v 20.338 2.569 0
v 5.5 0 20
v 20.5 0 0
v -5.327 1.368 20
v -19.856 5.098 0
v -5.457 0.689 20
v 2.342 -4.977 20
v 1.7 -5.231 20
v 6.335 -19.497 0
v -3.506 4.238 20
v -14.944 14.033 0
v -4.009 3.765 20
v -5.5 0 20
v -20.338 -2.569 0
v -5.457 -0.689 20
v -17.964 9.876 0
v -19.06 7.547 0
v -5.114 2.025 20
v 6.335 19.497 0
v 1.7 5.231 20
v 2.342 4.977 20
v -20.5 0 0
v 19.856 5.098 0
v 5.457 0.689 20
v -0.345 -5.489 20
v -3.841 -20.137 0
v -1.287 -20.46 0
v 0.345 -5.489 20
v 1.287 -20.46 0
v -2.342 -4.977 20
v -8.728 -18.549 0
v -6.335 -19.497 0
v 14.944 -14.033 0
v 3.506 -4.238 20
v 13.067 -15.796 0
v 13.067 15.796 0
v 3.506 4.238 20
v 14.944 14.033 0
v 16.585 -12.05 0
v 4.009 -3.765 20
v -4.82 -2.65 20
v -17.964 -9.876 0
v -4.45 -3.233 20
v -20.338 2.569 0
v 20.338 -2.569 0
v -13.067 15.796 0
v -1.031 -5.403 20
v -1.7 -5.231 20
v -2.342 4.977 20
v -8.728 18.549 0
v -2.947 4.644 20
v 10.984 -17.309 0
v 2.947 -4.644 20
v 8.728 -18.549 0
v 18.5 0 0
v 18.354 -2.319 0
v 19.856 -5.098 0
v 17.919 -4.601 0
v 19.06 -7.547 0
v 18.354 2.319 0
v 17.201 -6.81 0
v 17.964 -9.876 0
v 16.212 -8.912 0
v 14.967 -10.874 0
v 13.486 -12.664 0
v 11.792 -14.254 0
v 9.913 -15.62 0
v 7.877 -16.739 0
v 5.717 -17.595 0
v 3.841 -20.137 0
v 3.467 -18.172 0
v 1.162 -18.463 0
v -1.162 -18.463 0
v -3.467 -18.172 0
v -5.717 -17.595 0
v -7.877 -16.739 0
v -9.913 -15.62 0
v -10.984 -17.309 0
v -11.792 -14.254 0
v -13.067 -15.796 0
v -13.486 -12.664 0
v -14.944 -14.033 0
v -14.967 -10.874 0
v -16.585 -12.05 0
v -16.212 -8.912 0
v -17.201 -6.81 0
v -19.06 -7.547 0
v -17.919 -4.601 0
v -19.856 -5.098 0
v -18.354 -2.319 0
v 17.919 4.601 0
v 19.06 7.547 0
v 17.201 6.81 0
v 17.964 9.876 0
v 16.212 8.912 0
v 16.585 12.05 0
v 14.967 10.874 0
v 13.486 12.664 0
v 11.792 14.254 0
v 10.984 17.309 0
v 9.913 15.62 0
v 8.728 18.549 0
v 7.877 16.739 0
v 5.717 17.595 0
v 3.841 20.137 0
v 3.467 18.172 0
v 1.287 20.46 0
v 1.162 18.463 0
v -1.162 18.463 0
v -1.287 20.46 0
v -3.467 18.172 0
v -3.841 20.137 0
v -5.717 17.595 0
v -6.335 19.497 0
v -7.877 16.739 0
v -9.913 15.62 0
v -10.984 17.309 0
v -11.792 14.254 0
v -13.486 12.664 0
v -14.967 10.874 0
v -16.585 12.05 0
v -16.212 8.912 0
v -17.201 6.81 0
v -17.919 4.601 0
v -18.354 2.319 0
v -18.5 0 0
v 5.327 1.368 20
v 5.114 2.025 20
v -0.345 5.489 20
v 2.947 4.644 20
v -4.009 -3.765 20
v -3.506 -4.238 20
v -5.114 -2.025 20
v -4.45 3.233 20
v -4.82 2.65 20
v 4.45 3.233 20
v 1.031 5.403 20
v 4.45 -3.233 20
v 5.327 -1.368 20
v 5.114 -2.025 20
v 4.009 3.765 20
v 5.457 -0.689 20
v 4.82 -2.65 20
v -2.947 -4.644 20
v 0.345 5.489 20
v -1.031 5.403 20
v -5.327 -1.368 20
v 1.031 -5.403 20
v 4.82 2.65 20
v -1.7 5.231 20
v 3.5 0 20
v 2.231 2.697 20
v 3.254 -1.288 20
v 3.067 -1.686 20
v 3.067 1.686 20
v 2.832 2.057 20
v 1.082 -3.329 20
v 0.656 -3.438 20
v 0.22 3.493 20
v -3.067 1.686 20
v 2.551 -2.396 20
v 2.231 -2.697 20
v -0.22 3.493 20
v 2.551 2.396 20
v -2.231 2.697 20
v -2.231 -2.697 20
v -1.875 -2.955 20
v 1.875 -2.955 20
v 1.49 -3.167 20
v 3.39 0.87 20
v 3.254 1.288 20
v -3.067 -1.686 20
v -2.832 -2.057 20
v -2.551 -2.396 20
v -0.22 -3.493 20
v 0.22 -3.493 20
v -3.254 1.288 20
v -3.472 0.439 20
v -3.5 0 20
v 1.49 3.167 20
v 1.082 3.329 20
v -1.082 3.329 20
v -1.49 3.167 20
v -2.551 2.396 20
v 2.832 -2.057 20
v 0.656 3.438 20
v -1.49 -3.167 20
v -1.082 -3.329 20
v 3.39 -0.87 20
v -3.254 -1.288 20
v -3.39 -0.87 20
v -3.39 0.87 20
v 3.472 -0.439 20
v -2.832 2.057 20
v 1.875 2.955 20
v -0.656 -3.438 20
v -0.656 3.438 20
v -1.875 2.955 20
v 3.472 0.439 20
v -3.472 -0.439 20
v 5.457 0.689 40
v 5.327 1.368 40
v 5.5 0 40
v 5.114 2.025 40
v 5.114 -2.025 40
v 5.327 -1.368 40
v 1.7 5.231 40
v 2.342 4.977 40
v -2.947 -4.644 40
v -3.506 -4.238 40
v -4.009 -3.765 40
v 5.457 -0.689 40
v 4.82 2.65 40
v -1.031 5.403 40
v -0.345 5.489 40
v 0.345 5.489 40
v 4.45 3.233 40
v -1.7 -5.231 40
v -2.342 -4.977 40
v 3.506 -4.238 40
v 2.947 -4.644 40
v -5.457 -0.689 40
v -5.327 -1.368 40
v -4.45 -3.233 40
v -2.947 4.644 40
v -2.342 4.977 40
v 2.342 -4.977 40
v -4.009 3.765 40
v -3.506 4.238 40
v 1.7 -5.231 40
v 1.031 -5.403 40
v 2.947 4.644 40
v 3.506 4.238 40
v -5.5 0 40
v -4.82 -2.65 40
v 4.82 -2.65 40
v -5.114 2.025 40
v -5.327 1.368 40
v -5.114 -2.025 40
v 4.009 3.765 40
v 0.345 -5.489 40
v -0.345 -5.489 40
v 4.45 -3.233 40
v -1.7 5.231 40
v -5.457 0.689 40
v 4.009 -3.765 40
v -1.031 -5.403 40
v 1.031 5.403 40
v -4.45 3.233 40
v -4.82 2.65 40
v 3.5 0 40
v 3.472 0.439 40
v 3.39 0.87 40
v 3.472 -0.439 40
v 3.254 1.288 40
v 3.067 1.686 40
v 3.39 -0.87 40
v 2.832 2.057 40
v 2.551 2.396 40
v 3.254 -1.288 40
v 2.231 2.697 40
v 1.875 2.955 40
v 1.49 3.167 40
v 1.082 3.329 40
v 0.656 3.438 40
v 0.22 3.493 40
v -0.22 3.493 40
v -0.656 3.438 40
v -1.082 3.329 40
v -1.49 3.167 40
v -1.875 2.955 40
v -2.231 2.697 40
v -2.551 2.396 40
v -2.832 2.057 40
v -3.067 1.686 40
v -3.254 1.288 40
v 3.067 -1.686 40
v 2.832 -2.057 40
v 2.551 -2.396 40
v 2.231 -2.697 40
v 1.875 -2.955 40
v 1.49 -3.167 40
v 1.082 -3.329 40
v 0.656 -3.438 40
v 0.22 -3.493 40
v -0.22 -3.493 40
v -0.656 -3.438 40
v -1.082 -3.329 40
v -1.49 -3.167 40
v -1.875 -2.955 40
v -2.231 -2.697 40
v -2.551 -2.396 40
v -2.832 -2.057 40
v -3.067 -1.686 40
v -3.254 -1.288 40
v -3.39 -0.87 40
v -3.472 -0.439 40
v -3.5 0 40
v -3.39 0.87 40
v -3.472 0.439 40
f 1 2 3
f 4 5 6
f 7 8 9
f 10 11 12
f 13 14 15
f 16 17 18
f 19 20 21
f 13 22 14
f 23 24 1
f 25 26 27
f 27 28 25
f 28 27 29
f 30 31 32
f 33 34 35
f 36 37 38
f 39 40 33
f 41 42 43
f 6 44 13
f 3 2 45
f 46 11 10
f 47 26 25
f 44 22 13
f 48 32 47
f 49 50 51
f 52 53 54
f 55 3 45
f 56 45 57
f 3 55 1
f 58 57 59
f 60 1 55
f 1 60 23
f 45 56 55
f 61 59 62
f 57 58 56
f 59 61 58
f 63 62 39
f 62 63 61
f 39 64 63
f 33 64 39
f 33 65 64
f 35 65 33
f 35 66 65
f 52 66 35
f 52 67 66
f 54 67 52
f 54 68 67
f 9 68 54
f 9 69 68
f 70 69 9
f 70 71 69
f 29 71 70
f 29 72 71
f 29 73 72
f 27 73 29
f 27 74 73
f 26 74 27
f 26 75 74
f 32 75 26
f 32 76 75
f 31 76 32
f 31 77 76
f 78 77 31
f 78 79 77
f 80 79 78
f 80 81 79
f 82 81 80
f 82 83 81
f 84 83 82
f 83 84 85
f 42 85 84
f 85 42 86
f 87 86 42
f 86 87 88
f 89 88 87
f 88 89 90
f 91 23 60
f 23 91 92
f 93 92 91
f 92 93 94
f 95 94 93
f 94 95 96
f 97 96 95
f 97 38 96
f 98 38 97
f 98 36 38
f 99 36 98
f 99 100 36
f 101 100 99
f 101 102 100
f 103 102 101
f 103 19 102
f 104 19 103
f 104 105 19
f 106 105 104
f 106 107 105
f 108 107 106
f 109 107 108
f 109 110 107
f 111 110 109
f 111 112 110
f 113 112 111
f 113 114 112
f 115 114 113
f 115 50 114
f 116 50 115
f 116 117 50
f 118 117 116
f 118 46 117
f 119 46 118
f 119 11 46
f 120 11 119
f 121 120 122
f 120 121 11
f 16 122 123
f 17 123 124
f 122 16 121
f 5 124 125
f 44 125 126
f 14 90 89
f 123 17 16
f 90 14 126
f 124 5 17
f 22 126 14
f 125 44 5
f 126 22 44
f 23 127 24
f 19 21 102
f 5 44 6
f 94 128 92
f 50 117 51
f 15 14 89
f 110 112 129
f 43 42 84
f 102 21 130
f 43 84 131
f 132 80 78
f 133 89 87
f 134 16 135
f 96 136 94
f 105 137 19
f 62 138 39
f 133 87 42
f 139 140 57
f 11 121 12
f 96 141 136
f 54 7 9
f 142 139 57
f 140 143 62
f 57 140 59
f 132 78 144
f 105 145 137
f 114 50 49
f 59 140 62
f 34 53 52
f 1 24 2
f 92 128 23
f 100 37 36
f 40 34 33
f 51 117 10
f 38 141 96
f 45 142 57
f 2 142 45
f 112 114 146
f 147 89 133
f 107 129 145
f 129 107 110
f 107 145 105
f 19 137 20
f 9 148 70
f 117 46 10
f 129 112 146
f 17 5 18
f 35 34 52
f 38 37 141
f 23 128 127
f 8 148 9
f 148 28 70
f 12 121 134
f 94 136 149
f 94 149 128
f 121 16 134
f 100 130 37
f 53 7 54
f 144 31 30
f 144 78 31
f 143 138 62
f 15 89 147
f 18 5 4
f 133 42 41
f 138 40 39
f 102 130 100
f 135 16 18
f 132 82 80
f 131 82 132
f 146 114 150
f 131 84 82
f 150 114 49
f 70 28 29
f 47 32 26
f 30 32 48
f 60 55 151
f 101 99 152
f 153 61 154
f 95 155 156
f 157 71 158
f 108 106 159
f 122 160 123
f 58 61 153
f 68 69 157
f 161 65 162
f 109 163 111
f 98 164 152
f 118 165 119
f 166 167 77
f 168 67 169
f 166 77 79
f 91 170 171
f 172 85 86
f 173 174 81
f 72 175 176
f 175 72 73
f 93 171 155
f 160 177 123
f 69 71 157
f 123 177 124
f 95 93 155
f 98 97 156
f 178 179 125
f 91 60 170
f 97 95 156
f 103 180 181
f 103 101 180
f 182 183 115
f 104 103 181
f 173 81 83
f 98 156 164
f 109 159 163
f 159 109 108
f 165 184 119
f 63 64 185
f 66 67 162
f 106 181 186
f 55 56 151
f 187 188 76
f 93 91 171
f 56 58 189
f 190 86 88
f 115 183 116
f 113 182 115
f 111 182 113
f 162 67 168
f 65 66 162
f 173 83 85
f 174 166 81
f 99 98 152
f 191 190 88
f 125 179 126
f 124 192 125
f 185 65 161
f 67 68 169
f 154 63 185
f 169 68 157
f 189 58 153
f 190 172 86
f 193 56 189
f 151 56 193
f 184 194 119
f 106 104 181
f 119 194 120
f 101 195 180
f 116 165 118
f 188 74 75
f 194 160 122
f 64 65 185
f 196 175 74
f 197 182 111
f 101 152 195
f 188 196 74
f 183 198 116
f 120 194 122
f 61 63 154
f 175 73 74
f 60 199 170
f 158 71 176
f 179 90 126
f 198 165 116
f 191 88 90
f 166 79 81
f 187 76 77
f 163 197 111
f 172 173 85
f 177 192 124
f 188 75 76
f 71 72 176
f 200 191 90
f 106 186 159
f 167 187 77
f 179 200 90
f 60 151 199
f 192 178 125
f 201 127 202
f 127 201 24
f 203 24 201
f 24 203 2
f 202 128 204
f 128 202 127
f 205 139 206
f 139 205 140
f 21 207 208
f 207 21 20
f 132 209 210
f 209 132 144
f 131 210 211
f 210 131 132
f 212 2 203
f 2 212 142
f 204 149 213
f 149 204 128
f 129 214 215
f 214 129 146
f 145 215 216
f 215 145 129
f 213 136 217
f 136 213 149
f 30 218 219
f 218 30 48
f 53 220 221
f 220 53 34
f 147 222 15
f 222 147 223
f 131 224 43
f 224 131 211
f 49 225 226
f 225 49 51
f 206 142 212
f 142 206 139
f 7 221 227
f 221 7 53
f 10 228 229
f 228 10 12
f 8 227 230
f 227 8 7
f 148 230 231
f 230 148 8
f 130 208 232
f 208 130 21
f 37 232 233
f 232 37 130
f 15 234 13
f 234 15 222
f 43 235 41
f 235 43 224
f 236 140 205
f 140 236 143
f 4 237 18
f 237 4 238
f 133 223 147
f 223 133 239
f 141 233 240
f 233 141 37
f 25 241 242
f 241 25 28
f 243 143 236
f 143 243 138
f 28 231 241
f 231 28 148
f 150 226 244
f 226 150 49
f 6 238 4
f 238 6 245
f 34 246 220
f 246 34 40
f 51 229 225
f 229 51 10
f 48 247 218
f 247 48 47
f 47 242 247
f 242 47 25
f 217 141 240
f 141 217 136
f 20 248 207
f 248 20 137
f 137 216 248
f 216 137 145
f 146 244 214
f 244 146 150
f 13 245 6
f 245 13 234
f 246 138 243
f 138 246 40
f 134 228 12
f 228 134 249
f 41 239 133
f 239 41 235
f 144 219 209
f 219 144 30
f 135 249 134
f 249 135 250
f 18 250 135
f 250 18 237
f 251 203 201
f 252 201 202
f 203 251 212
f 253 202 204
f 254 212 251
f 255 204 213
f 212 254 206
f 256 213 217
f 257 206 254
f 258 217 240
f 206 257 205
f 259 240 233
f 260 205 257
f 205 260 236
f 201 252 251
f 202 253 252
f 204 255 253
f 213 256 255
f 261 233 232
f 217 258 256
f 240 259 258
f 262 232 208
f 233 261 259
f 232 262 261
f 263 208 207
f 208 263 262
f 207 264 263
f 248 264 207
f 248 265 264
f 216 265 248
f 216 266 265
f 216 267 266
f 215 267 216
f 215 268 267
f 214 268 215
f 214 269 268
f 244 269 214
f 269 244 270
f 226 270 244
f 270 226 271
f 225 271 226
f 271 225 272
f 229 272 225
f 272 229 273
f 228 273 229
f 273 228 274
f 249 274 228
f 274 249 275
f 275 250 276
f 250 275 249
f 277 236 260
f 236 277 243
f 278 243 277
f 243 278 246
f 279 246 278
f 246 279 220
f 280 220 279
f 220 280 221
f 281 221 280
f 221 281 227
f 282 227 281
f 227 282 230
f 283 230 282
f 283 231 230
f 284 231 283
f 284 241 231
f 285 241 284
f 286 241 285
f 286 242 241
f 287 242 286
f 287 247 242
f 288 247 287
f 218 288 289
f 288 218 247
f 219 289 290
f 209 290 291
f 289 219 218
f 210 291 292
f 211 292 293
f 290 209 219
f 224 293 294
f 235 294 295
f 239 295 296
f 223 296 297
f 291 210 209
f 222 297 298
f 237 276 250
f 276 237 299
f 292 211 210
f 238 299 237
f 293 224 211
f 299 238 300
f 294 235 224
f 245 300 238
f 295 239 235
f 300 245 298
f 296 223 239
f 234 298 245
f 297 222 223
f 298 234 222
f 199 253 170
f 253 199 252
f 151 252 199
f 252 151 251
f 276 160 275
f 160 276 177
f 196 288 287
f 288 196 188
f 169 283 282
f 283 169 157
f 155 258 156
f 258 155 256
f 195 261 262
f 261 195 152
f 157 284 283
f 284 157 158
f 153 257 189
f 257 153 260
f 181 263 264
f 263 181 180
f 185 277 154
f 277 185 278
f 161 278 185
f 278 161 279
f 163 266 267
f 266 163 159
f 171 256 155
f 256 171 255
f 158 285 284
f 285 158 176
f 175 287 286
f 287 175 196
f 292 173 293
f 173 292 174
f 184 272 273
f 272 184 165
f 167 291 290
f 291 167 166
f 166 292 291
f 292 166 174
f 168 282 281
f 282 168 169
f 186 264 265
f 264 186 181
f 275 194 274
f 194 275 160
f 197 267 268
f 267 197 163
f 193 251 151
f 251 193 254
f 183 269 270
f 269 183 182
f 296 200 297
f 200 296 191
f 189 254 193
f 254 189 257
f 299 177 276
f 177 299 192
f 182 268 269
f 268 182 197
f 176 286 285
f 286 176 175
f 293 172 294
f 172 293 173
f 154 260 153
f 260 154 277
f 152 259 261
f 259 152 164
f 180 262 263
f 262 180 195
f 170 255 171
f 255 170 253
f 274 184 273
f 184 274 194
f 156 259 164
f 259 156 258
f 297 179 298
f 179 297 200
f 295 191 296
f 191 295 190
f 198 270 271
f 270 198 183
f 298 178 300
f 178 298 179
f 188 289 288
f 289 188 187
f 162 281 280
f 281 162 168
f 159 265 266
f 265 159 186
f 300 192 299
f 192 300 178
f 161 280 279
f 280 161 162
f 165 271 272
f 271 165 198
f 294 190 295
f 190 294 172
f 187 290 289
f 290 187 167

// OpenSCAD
$fn = 50;


difference() {
	union() {
		translate(v = [0, 0, 0]) {
			rotate(a = [0, 0, 0]) {
				difference() {
					union() {
						cylinder(h = 20, r1 = 20.5000000000, r2 = 5.5000000000);
					}
					union() {
						cylinder(h = 20, r1 = 18.5000000000, r2 = 3.5000000000);
					}
				}
			}
		}
		translate(v = [0, 0, 20]) {
			rotate(a = [0, 0, 0]) {
				difference() {
					union() {
						cylinder(h = 20, r = 5.5000000000);
					}
					union() {
						cylinder(h = 20, r = 3.5000000000);
					}
				}
			}
		}
	}
	union();
}
